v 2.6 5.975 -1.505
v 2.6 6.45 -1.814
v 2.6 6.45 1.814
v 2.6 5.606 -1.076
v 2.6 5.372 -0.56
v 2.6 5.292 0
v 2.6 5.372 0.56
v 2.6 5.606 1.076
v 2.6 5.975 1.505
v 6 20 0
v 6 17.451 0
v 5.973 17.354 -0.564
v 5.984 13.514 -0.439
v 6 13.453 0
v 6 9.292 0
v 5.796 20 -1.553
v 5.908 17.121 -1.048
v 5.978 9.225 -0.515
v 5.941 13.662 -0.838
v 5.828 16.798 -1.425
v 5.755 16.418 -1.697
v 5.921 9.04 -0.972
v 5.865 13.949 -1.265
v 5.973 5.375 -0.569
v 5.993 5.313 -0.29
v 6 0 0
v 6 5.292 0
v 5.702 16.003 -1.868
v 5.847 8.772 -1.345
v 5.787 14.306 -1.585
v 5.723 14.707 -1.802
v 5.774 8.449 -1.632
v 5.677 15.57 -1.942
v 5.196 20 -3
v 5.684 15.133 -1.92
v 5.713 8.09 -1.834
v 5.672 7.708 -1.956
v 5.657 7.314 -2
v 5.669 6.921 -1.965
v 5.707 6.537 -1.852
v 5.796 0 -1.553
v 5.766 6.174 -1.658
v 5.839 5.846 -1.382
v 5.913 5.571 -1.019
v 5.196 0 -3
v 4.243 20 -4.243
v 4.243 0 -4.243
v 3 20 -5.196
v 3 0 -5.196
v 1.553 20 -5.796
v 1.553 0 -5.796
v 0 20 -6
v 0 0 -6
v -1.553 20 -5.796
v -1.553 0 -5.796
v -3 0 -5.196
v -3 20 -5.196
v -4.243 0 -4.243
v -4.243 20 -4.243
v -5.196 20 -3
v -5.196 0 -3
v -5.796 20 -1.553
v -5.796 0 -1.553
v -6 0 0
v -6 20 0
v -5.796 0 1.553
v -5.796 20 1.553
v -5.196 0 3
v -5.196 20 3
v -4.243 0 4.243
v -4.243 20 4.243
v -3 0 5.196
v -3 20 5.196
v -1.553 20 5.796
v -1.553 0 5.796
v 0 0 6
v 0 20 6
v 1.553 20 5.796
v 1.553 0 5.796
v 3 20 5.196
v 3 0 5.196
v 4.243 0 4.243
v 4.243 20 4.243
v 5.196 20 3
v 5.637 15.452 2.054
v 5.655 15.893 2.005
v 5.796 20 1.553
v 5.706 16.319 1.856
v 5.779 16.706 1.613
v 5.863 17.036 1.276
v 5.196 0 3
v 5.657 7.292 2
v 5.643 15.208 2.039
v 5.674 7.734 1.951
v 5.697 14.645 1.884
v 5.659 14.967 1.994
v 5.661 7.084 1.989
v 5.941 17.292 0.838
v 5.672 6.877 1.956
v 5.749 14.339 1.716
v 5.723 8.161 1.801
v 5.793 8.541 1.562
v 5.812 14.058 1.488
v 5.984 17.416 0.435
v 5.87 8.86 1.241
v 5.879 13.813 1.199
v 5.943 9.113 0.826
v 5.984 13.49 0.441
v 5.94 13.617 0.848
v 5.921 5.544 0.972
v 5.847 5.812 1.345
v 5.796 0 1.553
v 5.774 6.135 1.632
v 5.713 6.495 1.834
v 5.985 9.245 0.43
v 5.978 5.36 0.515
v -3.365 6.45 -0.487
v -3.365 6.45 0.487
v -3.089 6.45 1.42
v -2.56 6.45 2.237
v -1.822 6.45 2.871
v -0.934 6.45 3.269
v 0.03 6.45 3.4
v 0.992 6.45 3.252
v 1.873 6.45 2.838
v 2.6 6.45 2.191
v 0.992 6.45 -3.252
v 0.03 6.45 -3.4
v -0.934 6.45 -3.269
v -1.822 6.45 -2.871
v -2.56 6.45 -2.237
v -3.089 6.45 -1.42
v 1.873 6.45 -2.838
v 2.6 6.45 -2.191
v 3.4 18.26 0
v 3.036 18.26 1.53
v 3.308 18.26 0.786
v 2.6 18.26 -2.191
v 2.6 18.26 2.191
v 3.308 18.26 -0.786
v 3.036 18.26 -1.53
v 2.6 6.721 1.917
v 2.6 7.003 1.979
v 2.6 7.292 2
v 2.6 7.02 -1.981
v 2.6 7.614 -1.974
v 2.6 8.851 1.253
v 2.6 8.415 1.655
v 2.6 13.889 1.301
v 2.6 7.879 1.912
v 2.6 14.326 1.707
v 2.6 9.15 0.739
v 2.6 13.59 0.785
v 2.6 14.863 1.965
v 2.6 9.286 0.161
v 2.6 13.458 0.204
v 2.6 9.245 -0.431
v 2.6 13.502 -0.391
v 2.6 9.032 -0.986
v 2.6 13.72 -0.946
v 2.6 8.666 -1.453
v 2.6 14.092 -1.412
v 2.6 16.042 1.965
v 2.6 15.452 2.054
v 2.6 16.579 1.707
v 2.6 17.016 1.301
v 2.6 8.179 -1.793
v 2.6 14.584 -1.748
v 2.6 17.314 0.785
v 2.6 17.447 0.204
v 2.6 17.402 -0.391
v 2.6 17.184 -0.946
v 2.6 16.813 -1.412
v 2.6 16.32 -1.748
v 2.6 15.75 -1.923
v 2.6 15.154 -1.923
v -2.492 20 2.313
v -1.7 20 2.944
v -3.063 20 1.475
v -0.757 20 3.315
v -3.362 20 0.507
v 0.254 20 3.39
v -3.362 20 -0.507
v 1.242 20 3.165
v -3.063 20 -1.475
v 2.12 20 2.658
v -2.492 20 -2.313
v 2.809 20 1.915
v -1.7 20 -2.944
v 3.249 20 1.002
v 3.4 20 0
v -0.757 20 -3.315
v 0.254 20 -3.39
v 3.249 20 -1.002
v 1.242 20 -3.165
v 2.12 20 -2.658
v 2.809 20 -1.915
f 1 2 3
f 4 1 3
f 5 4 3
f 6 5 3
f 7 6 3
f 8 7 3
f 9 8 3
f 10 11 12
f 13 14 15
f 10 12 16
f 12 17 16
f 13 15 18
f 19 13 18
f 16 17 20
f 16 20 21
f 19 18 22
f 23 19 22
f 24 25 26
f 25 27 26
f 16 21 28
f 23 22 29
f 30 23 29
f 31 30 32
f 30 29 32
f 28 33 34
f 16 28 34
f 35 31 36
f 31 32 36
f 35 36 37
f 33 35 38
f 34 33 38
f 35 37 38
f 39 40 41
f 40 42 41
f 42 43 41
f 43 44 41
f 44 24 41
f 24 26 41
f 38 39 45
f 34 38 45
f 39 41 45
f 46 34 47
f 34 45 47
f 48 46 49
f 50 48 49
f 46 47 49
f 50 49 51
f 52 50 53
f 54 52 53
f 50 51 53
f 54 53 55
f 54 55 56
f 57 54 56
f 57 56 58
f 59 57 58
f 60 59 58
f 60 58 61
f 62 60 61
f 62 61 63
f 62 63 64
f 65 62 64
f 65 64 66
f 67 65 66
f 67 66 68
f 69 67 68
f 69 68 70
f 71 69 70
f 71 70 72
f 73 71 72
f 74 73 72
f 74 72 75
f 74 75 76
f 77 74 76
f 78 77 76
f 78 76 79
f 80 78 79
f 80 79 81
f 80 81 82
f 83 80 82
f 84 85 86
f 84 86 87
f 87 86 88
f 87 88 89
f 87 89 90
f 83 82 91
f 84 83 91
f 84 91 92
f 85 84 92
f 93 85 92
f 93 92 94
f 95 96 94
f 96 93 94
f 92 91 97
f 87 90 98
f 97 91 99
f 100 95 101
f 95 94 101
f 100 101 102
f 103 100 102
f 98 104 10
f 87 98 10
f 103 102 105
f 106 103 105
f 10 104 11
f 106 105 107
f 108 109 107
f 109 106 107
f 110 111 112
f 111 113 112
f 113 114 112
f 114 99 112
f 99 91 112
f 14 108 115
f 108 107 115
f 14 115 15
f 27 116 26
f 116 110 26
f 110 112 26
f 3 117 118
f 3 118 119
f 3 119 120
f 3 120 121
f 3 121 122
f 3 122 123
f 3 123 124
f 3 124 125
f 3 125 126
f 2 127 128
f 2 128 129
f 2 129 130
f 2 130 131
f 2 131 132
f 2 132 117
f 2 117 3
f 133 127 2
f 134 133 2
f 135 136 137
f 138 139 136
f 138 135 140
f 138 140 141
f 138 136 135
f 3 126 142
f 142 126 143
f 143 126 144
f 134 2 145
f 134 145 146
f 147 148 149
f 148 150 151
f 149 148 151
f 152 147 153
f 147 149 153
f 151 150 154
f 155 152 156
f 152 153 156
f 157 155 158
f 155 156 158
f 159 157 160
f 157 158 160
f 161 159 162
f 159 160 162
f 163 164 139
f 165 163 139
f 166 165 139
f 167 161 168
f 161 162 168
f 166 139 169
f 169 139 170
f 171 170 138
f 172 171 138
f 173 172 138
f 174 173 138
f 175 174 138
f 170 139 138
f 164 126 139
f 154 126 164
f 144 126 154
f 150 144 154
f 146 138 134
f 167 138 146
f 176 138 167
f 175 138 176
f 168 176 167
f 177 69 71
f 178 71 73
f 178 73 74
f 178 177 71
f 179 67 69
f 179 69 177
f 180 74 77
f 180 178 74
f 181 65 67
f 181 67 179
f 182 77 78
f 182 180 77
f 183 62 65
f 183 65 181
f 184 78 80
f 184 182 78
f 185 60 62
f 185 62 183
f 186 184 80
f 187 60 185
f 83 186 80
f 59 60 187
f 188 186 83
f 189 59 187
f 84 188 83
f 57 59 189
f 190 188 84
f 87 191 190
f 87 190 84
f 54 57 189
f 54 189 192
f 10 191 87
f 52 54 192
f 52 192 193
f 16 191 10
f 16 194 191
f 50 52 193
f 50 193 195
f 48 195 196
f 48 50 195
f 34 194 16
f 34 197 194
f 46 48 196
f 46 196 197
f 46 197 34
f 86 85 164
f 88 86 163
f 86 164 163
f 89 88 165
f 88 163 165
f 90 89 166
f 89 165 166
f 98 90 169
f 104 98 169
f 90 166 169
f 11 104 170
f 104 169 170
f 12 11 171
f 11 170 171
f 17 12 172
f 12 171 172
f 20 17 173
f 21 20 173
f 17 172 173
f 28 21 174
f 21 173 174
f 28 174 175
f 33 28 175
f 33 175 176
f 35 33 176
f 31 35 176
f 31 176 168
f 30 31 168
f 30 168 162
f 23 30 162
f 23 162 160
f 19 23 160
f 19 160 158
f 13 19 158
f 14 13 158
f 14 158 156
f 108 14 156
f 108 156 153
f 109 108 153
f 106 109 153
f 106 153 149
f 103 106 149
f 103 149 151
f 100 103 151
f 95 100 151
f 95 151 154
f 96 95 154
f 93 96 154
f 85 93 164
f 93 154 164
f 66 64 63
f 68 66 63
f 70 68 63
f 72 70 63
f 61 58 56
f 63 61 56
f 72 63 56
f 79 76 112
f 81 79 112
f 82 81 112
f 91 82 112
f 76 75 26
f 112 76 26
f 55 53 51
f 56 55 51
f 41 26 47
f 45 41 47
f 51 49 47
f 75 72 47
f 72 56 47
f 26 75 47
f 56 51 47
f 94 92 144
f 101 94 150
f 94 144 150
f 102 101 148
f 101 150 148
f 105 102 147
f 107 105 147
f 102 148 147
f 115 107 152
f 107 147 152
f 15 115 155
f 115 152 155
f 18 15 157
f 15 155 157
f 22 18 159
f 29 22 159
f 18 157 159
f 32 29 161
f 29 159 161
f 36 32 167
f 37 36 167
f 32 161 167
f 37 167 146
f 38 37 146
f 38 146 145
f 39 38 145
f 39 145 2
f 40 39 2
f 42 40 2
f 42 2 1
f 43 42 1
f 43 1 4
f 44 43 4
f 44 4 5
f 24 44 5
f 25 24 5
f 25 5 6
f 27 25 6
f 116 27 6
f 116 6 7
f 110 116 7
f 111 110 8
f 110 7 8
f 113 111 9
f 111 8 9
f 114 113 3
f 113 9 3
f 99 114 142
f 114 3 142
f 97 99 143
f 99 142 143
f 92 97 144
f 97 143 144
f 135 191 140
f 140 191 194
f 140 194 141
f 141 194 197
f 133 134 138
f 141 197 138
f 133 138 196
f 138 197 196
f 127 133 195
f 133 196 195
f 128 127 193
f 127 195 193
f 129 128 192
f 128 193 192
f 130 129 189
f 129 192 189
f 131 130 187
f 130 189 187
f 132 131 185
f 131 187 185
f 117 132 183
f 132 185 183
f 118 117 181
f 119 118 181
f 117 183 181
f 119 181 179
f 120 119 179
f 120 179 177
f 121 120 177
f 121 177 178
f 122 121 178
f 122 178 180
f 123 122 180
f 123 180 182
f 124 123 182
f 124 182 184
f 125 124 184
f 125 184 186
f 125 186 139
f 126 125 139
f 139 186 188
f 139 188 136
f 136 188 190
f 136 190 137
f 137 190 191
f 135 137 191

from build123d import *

# Parameters (mm, degrees)
SKETCH1_R           = 6
BOSS_EXTRUDE1_DEPTH = 20
SKETCH2_R           = 3.4
CUT_EXTRUDE1_DEPTH  = 13.55
SKETCH5_W           = 1.550685087
SKETCH5_H           = 7.184215806
BOSS_EXTRUDE2_DEPTH = 13.55
SKETCH6_R           = 2
CUT_EXTRUDE2_DEPTH  = 13.55


with BuildPart() as part:
    # Sketch1 → Boss-Extrude1 (new body)
    with BuildSketch(Plane(origin=(0, 0, 0), x_dir=(1, 0, 0), z_dir=(0, 1, 0))):
        Circle(SKETCH1_R)
    extrude(amount=BOSS_EXTRUDE1_DEPTH)

    # Sketch2 → Cut-Extrude1 (cut)
    with BuildSketch(Plane(origin=(0, 20, 0), x_dir=(1, 0, 0), z_dir=(0, 1, 0))):
        Circle(SKETCH2_R)
    extrude(amount=-CUT_EXTRUDE1_DEPTH, mode=Mode.SUBTRACT)

    # Sketch5 → Boss-Extrude2 (add)
    with BuildSketch(Plane(origin=(0, 18.26, 0), x_dir=(1, 0, 0), z_dir=(0, 1, 0))):
        with Locations((3.375342544, 0.020519704)):
            Rectangle(SKETCH5_W, SKETCH5_H)
    extrude(amount=-BOSS_EXTRUDE2_DEPTH)

    # Sketch6 → Cut-Extrude2 (cut)
    with BuildSketch(Plane.ZY.offset(-2.6)):
        with Locations((0.054169736, 15.452187313)):
            Circle(SKETCH6_R)
        with Locations((0, 7.29207964)):
            Circle(SKETCH6_R)
    extrude(amount=-CUT_EXTRUDE2_DEPTH, mode=Mode.SUBTRACT)


solid = part.part
